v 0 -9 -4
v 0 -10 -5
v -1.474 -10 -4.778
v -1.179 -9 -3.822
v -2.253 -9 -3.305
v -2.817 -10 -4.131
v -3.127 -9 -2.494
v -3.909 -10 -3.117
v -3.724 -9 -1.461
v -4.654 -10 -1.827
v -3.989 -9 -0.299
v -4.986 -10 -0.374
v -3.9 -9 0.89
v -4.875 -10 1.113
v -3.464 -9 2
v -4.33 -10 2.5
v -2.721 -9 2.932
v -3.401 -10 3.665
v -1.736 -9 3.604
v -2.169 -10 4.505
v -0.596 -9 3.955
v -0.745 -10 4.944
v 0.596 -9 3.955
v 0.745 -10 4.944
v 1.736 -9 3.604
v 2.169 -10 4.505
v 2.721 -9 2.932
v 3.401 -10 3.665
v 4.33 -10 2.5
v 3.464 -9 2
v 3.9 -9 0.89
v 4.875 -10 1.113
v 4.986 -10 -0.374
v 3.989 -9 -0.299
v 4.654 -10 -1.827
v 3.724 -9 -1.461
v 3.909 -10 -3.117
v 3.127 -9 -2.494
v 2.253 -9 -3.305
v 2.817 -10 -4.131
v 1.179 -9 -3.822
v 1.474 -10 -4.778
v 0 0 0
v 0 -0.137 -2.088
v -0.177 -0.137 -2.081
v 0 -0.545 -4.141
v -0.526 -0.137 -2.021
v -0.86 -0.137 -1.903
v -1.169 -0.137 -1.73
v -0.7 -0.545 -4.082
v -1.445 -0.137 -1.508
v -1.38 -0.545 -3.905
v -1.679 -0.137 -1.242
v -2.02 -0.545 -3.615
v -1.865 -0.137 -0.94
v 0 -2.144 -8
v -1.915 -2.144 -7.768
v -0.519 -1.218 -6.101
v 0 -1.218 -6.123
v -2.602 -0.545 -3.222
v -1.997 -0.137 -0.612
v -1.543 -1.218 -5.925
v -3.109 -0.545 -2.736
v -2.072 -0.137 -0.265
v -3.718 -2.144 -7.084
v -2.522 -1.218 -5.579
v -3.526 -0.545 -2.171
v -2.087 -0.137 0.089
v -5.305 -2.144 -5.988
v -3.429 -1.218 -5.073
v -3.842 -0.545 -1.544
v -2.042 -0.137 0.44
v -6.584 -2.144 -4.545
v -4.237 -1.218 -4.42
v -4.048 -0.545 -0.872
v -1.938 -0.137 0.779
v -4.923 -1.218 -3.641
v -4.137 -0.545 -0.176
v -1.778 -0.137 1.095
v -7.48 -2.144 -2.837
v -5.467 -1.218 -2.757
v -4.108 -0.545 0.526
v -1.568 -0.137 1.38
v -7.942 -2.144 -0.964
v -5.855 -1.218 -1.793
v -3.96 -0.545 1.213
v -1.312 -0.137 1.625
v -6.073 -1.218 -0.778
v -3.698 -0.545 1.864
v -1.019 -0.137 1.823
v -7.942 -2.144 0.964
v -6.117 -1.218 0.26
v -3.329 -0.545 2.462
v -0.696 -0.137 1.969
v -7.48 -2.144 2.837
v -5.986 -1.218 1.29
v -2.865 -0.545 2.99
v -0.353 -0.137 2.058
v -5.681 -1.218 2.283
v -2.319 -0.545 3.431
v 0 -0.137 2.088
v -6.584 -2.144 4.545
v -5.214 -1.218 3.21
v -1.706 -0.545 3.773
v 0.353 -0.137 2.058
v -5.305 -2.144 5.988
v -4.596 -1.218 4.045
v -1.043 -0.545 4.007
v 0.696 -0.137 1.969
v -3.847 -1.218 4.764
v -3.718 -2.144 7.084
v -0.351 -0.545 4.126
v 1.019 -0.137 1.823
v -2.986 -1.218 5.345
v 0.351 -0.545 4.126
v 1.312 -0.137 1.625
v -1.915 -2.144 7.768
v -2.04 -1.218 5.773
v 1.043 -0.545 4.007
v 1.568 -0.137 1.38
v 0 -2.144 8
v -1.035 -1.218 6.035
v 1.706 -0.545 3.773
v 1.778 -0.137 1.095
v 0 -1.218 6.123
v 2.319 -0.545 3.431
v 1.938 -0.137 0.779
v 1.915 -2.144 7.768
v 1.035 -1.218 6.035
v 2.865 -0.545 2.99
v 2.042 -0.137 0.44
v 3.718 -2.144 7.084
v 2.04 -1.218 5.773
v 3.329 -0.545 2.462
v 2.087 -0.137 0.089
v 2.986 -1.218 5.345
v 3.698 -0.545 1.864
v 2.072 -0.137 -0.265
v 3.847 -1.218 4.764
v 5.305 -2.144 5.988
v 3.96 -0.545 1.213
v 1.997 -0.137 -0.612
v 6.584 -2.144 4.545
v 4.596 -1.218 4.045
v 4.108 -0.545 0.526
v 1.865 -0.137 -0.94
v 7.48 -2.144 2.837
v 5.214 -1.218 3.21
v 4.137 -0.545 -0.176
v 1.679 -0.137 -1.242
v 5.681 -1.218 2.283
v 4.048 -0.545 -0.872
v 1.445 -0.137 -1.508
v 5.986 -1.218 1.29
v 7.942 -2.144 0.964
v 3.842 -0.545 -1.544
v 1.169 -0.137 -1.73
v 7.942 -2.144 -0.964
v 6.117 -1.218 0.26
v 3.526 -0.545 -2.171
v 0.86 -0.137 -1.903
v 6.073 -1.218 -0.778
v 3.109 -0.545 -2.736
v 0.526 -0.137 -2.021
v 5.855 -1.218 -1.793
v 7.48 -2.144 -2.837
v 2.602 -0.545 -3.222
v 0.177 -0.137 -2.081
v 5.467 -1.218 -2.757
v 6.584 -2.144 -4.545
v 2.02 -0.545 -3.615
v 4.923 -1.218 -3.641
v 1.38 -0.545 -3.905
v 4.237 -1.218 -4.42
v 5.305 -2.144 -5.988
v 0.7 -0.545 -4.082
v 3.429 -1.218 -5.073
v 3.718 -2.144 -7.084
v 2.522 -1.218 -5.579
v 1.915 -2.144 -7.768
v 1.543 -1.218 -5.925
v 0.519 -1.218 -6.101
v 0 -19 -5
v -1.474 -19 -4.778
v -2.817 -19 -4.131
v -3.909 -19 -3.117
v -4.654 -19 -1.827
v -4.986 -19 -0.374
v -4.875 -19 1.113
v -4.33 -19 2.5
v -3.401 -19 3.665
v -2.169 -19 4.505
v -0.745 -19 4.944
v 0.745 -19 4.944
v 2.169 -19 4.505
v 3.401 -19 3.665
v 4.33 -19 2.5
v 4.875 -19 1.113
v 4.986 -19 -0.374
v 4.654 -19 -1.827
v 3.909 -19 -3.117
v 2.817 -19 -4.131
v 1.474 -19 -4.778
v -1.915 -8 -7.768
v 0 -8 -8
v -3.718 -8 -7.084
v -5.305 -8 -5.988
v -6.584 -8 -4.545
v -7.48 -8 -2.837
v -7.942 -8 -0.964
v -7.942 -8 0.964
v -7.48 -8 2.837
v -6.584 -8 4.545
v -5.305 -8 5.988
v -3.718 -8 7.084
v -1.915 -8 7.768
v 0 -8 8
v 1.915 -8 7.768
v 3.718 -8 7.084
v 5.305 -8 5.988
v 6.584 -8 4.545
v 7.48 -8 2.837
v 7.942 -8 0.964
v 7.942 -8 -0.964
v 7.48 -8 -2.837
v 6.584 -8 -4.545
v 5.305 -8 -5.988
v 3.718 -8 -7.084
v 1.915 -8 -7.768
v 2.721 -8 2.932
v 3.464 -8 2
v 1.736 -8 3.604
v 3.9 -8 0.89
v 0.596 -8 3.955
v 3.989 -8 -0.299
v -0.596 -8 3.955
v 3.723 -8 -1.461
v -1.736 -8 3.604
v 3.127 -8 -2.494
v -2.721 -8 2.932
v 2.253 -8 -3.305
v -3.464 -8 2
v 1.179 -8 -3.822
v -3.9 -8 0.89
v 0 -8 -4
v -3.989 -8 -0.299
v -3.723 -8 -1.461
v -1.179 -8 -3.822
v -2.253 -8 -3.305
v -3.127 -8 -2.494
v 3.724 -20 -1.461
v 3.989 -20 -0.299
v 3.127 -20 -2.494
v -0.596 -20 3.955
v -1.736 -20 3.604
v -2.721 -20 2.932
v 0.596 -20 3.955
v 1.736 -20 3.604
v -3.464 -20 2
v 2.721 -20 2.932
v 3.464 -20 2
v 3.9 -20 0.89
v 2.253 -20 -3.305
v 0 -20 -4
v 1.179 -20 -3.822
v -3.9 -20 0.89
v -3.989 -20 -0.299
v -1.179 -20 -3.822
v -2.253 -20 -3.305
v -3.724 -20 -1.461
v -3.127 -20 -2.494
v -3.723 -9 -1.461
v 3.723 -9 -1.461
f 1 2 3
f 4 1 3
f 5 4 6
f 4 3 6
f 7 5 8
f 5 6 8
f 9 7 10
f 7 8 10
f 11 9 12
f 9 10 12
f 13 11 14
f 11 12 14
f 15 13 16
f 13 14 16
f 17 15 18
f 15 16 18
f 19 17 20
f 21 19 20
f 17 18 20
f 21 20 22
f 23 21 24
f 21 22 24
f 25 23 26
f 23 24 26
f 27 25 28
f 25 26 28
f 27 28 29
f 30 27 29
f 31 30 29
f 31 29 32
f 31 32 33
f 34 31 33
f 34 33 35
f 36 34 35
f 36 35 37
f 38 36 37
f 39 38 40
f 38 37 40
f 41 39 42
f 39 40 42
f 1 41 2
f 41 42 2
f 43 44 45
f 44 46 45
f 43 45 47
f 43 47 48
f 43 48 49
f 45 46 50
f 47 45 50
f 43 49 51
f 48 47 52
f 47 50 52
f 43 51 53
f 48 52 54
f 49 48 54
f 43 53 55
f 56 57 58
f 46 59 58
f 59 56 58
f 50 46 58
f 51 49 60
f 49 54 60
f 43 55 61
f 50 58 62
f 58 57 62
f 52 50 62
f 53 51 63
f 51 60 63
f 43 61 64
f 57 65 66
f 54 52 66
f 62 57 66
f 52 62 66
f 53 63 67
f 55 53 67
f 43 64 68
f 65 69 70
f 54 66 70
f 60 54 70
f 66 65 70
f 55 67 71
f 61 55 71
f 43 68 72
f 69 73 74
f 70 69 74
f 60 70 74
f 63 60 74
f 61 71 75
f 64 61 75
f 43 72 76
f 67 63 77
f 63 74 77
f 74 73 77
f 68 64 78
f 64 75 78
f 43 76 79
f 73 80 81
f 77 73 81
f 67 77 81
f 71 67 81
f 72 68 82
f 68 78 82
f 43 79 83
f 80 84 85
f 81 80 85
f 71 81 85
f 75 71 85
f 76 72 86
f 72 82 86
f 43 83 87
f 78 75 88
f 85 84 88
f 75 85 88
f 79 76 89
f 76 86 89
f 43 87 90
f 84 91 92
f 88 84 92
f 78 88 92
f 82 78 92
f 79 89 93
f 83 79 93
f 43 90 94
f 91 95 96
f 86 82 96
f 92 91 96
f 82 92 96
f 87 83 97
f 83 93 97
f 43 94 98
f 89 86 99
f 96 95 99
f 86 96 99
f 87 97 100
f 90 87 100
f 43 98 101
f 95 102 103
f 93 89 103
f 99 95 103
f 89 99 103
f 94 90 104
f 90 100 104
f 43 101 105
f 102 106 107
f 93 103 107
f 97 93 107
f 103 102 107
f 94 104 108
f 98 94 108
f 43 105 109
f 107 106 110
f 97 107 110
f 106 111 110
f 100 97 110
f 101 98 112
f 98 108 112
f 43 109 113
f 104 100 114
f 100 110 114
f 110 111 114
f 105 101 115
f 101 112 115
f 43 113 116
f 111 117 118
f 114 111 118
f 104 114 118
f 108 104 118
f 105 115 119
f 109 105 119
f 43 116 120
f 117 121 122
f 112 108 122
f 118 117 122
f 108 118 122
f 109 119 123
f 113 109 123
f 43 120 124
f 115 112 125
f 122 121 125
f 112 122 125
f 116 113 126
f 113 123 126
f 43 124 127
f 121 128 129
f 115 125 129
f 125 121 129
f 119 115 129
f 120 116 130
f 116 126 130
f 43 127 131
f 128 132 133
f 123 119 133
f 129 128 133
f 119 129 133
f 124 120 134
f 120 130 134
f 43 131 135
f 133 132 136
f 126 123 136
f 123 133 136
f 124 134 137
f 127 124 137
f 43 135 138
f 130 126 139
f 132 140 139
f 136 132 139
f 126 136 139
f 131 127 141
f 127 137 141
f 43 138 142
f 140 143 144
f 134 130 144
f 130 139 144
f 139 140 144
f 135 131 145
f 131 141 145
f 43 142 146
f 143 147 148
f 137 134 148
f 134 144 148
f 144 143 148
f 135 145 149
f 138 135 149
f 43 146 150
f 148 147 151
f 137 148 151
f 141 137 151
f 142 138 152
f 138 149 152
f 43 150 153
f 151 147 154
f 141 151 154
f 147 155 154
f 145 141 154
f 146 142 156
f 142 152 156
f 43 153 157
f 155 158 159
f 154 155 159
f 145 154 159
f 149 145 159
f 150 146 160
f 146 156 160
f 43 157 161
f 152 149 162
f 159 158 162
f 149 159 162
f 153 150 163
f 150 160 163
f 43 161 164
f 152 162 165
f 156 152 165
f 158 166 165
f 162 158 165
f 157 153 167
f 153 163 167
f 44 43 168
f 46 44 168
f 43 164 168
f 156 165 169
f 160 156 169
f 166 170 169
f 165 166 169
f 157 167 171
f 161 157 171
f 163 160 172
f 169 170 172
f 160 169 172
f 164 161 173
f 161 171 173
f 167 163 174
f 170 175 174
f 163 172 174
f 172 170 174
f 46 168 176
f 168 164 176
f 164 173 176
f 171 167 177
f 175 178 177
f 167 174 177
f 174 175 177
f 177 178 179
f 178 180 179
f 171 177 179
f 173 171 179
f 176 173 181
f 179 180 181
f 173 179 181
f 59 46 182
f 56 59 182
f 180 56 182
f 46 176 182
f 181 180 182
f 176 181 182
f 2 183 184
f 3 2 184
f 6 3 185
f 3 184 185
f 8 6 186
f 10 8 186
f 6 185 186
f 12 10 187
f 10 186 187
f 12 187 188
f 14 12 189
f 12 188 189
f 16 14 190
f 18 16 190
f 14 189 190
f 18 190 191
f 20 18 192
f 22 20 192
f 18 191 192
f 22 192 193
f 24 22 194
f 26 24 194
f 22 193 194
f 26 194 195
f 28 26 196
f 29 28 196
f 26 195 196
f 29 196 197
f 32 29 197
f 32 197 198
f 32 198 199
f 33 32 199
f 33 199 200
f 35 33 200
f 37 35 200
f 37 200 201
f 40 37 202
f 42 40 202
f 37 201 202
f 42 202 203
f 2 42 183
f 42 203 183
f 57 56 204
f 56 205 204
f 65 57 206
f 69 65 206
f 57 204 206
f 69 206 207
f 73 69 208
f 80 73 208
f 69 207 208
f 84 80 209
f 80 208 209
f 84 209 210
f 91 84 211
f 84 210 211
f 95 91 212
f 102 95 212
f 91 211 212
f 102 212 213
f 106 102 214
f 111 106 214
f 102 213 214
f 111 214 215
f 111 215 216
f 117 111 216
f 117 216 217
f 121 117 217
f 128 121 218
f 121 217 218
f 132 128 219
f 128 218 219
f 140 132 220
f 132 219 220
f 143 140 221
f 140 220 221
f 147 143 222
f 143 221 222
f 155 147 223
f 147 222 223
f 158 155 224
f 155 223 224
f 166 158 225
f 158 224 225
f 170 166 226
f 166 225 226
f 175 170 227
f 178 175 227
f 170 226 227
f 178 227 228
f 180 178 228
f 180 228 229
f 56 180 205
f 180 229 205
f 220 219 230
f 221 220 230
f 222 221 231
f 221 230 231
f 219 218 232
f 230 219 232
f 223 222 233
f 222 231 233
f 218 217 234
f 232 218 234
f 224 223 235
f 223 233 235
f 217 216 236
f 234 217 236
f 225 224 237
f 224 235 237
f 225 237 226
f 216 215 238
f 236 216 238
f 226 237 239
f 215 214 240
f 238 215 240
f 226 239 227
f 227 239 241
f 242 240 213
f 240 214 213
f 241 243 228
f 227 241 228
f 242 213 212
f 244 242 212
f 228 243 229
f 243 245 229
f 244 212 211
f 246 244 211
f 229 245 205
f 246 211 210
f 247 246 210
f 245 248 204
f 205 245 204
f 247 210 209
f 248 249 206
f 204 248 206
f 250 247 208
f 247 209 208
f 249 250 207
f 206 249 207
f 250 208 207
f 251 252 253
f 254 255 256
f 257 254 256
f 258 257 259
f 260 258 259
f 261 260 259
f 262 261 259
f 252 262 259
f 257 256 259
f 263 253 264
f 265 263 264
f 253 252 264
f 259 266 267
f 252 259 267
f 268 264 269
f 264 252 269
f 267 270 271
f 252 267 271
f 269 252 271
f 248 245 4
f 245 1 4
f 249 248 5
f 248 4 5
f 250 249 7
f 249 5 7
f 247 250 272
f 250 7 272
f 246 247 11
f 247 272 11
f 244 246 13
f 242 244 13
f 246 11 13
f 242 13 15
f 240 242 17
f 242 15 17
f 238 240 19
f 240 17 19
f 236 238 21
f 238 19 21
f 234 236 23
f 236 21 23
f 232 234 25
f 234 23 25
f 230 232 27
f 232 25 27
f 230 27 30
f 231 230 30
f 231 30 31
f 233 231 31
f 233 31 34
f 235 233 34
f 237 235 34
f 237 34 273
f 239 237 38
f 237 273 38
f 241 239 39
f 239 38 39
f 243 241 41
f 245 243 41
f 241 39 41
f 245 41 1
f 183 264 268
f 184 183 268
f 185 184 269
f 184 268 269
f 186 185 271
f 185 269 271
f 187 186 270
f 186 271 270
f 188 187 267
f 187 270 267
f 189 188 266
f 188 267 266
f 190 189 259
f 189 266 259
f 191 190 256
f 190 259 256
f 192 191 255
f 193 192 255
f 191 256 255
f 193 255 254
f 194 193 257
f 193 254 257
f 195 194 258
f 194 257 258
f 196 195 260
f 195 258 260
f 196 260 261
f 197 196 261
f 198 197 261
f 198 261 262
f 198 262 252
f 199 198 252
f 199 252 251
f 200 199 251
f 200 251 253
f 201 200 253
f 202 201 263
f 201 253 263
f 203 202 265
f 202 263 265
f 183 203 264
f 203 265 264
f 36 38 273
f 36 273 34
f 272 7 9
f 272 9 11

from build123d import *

# Parameters (mm, degrees)
CHAMFER_1_SIZE = 1


with BuildPart() as part:
    # 草图1 → 旋转1 (revolve)
    with BuildSketch(Plane.XY, mode=Mode.PRIVATE) as revolve_1_sk:
        with BuildLine():
            Line((8, -2.143593539), (8, -8))
            Line((8, -8), (4, -8))
            Line((4, -8), (4, -9))
            Line((4, -9), (5, -9))
            Line((5, -9), (5, -20))
            Line((5, -20), (0, -20))
            Line((0, -20), (0, 0))
            ThreePointArc((0, 0), (4.141104722, -0.545186779), (8, -2.143593539))
        make_face()
    revolve(revolve_1_sk.sketch.rotate(Axis((0, -20, 0), (0, 1, 0)), 90), axis=Axis((0, -20, 0), (0, 1, 0)))

    # 倒角1
    chamfer_1_edges = [part.edges().sort_by_distance(p)[0] for p in [
        (0, -9, 5),
        (0, -20, 5),
    ]]
    chamfer(chamfer_1_edges, length=CHAMFER_1_SIZE - 0.0001)  # a hair under: the kernel refuses the full size


solid = part.part
